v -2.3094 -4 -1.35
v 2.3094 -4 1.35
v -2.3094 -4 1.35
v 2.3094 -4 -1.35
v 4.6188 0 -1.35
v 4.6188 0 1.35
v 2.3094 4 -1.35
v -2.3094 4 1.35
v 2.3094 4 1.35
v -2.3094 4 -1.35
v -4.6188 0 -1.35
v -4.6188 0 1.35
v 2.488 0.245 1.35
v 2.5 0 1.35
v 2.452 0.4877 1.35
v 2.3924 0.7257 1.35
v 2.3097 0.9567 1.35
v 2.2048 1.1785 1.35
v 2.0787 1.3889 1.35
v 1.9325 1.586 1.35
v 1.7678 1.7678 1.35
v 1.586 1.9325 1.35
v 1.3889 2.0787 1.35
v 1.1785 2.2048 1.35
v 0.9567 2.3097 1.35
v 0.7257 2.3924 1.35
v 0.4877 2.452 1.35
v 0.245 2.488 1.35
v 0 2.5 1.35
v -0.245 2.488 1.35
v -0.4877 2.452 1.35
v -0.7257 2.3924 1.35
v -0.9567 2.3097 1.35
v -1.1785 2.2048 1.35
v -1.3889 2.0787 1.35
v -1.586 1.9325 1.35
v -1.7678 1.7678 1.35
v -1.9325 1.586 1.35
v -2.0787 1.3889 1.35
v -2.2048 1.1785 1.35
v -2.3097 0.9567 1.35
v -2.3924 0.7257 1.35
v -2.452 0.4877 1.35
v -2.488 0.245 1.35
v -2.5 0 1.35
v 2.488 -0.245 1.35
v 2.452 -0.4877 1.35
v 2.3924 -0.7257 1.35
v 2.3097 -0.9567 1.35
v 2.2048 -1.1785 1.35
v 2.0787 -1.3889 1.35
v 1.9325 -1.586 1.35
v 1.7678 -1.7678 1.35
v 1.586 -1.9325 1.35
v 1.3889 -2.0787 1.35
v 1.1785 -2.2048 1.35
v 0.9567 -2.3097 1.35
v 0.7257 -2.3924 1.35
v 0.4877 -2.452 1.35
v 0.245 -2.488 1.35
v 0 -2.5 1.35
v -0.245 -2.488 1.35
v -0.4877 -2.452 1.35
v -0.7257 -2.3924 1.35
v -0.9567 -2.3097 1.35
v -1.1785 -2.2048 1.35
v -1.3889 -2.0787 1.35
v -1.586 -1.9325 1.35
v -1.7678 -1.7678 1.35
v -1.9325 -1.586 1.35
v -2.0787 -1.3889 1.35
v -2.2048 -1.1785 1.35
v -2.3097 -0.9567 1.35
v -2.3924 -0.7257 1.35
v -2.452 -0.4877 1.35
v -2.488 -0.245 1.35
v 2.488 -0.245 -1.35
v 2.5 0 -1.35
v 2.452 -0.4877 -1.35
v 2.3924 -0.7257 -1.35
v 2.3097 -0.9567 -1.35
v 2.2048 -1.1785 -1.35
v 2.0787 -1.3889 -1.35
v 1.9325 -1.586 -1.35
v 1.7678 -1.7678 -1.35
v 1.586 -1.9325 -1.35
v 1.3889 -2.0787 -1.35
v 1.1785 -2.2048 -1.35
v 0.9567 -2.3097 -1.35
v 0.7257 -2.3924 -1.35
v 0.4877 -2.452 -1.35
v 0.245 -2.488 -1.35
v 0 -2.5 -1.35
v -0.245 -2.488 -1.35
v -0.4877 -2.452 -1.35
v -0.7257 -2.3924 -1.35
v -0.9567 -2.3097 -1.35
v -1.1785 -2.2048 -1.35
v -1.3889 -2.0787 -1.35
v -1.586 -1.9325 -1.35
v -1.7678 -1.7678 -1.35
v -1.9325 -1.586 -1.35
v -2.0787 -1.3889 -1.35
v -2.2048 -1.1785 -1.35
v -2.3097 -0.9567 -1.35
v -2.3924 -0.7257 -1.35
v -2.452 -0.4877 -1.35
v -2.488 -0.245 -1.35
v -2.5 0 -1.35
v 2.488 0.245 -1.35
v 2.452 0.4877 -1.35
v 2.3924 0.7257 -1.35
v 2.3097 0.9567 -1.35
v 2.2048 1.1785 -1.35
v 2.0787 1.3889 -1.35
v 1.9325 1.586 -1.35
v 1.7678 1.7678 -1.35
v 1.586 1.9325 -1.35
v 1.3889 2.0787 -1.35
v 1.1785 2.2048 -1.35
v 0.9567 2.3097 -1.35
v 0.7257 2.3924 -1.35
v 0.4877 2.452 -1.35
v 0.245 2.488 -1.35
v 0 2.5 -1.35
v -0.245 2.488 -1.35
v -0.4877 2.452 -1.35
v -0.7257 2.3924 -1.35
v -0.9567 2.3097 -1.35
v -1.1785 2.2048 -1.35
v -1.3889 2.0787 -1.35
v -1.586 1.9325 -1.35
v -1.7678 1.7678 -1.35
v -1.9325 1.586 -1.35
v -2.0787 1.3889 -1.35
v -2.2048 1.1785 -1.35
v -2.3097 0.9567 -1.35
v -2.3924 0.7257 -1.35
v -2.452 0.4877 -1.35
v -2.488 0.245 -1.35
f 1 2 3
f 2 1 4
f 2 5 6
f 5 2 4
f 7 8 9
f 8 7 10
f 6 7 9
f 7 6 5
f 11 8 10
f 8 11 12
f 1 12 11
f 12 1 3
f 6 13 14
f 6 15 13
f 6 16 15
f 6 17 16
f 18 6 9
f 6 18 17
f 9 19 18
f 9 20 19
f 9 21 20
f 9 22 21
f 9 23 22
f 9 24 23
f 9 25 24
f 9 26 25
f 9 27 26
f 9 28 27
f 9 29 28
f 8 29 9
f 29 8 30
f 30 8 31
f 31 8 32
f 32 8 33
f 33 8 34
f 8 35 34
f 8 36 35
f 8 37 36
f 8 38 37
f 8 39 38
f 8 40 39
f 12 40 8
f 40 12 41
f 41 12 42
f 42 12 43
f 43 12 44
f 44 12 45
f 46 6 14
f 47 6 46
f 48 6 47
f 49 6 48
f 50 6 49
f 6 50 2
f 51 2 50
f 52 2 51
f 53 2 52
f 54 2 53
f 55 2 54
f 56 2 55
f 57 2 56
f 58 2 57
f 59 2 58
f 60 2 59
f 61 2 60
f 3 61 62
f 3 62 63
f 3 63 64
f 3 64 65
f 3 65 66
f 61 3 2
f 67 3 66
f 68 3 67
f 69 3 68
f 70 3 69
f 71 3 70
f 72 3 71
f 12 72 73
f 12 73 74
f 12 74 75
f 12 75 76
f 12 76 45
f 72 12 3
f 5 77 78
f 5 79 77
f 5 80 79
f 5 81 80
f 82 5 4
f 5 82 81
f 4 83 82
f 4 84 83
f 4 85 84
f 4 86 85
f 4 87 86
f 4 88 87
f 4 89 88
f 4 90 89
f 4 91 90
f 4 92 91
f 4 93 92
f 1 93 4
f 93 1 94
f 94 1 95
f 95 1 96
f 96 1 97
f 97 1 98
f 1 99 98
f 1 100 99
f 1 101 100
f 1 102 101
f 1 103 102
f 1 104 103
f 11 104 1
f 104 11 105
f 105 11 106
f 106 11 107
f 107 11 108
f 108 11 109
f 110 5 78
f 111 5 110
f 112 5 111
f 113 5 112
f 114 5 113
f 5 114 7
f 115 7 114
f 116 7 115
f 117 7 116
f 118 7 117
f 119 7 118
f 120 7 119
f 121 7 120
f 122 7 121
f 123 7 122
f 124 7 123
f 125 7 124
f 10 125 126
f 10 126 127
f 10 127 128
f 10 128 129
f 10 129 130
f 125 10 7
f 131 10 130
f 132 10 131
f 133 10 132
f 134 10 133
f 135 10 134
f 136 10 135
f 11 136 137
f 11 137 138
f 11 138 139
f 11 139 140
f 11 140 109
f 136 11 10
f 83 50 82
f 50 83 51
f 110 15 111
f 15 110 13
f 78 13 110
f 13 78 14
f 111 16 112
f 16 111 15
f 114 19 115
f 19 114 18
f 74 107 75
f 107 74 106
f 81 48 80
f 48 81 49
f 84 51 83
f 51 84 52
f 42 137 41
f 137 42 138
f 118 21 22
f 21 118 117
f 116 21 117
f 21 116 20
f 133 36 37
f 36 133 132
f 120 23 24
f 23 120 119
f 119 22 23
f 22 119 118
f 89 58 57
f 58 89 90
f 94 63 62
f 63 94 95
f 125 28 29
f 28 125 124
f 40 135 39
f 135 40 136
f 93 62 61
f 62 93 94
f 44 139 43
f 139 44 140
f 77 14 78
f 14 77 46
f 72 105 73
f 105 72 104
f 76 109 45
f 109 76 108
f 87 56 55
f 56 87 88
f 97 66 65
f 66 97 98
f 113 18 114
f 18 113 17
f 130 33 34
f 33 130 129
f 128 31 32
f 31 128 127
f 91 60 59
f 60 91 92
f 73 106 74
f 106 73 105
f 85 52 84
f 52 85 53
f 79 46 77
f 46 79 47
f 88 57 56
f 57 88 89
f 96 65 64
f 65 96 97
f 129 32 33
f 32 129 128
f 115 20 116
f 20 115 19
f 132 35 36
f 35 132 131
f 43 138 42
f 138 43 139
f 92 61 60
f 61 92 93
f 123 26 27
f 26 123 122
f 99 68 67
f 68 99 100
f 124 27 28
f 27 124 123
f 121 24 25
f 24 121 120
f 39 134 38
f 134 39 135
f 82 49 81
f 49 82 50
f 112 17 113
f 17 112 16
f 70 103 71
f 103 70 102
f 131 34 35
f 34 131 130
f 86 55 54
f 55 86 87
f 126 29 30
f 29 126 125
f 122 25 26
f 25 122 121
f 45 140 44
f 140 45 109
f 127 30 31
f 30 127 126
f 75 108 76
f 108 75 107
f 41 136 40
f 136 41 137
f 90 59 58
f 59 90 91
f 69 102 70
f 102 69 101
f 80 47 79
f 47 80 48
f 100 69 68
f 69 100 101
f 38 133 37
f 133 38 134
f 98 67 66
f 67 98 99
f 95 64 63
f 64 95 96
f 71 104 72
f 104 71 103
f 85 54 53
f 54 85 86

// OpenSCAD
// Thin hex nut: 5.0mm through-hole, 8.0mm across flats, 2.7mm thick

module hex_nut(af=8.0, thickness=2.7, hole_d=5.0) {
    // For a regular hex, across-flats = 2 * apothem = sqrt(3) * R (circumradius)
    R = af / sqrt(3);
    eps = 0.02;

    difference() {
        // Centered body for robust boolean operations and clear side views
        cylinder(h=thickness, r=R, $fn=6, center=true);

        // Through-hole (slightly extended to guarantee a clean cut)
        cylinder(h=thickness + 2*eps, r=hole_d/2, $fn=64, center=true);
    }
}

hex_nut();
